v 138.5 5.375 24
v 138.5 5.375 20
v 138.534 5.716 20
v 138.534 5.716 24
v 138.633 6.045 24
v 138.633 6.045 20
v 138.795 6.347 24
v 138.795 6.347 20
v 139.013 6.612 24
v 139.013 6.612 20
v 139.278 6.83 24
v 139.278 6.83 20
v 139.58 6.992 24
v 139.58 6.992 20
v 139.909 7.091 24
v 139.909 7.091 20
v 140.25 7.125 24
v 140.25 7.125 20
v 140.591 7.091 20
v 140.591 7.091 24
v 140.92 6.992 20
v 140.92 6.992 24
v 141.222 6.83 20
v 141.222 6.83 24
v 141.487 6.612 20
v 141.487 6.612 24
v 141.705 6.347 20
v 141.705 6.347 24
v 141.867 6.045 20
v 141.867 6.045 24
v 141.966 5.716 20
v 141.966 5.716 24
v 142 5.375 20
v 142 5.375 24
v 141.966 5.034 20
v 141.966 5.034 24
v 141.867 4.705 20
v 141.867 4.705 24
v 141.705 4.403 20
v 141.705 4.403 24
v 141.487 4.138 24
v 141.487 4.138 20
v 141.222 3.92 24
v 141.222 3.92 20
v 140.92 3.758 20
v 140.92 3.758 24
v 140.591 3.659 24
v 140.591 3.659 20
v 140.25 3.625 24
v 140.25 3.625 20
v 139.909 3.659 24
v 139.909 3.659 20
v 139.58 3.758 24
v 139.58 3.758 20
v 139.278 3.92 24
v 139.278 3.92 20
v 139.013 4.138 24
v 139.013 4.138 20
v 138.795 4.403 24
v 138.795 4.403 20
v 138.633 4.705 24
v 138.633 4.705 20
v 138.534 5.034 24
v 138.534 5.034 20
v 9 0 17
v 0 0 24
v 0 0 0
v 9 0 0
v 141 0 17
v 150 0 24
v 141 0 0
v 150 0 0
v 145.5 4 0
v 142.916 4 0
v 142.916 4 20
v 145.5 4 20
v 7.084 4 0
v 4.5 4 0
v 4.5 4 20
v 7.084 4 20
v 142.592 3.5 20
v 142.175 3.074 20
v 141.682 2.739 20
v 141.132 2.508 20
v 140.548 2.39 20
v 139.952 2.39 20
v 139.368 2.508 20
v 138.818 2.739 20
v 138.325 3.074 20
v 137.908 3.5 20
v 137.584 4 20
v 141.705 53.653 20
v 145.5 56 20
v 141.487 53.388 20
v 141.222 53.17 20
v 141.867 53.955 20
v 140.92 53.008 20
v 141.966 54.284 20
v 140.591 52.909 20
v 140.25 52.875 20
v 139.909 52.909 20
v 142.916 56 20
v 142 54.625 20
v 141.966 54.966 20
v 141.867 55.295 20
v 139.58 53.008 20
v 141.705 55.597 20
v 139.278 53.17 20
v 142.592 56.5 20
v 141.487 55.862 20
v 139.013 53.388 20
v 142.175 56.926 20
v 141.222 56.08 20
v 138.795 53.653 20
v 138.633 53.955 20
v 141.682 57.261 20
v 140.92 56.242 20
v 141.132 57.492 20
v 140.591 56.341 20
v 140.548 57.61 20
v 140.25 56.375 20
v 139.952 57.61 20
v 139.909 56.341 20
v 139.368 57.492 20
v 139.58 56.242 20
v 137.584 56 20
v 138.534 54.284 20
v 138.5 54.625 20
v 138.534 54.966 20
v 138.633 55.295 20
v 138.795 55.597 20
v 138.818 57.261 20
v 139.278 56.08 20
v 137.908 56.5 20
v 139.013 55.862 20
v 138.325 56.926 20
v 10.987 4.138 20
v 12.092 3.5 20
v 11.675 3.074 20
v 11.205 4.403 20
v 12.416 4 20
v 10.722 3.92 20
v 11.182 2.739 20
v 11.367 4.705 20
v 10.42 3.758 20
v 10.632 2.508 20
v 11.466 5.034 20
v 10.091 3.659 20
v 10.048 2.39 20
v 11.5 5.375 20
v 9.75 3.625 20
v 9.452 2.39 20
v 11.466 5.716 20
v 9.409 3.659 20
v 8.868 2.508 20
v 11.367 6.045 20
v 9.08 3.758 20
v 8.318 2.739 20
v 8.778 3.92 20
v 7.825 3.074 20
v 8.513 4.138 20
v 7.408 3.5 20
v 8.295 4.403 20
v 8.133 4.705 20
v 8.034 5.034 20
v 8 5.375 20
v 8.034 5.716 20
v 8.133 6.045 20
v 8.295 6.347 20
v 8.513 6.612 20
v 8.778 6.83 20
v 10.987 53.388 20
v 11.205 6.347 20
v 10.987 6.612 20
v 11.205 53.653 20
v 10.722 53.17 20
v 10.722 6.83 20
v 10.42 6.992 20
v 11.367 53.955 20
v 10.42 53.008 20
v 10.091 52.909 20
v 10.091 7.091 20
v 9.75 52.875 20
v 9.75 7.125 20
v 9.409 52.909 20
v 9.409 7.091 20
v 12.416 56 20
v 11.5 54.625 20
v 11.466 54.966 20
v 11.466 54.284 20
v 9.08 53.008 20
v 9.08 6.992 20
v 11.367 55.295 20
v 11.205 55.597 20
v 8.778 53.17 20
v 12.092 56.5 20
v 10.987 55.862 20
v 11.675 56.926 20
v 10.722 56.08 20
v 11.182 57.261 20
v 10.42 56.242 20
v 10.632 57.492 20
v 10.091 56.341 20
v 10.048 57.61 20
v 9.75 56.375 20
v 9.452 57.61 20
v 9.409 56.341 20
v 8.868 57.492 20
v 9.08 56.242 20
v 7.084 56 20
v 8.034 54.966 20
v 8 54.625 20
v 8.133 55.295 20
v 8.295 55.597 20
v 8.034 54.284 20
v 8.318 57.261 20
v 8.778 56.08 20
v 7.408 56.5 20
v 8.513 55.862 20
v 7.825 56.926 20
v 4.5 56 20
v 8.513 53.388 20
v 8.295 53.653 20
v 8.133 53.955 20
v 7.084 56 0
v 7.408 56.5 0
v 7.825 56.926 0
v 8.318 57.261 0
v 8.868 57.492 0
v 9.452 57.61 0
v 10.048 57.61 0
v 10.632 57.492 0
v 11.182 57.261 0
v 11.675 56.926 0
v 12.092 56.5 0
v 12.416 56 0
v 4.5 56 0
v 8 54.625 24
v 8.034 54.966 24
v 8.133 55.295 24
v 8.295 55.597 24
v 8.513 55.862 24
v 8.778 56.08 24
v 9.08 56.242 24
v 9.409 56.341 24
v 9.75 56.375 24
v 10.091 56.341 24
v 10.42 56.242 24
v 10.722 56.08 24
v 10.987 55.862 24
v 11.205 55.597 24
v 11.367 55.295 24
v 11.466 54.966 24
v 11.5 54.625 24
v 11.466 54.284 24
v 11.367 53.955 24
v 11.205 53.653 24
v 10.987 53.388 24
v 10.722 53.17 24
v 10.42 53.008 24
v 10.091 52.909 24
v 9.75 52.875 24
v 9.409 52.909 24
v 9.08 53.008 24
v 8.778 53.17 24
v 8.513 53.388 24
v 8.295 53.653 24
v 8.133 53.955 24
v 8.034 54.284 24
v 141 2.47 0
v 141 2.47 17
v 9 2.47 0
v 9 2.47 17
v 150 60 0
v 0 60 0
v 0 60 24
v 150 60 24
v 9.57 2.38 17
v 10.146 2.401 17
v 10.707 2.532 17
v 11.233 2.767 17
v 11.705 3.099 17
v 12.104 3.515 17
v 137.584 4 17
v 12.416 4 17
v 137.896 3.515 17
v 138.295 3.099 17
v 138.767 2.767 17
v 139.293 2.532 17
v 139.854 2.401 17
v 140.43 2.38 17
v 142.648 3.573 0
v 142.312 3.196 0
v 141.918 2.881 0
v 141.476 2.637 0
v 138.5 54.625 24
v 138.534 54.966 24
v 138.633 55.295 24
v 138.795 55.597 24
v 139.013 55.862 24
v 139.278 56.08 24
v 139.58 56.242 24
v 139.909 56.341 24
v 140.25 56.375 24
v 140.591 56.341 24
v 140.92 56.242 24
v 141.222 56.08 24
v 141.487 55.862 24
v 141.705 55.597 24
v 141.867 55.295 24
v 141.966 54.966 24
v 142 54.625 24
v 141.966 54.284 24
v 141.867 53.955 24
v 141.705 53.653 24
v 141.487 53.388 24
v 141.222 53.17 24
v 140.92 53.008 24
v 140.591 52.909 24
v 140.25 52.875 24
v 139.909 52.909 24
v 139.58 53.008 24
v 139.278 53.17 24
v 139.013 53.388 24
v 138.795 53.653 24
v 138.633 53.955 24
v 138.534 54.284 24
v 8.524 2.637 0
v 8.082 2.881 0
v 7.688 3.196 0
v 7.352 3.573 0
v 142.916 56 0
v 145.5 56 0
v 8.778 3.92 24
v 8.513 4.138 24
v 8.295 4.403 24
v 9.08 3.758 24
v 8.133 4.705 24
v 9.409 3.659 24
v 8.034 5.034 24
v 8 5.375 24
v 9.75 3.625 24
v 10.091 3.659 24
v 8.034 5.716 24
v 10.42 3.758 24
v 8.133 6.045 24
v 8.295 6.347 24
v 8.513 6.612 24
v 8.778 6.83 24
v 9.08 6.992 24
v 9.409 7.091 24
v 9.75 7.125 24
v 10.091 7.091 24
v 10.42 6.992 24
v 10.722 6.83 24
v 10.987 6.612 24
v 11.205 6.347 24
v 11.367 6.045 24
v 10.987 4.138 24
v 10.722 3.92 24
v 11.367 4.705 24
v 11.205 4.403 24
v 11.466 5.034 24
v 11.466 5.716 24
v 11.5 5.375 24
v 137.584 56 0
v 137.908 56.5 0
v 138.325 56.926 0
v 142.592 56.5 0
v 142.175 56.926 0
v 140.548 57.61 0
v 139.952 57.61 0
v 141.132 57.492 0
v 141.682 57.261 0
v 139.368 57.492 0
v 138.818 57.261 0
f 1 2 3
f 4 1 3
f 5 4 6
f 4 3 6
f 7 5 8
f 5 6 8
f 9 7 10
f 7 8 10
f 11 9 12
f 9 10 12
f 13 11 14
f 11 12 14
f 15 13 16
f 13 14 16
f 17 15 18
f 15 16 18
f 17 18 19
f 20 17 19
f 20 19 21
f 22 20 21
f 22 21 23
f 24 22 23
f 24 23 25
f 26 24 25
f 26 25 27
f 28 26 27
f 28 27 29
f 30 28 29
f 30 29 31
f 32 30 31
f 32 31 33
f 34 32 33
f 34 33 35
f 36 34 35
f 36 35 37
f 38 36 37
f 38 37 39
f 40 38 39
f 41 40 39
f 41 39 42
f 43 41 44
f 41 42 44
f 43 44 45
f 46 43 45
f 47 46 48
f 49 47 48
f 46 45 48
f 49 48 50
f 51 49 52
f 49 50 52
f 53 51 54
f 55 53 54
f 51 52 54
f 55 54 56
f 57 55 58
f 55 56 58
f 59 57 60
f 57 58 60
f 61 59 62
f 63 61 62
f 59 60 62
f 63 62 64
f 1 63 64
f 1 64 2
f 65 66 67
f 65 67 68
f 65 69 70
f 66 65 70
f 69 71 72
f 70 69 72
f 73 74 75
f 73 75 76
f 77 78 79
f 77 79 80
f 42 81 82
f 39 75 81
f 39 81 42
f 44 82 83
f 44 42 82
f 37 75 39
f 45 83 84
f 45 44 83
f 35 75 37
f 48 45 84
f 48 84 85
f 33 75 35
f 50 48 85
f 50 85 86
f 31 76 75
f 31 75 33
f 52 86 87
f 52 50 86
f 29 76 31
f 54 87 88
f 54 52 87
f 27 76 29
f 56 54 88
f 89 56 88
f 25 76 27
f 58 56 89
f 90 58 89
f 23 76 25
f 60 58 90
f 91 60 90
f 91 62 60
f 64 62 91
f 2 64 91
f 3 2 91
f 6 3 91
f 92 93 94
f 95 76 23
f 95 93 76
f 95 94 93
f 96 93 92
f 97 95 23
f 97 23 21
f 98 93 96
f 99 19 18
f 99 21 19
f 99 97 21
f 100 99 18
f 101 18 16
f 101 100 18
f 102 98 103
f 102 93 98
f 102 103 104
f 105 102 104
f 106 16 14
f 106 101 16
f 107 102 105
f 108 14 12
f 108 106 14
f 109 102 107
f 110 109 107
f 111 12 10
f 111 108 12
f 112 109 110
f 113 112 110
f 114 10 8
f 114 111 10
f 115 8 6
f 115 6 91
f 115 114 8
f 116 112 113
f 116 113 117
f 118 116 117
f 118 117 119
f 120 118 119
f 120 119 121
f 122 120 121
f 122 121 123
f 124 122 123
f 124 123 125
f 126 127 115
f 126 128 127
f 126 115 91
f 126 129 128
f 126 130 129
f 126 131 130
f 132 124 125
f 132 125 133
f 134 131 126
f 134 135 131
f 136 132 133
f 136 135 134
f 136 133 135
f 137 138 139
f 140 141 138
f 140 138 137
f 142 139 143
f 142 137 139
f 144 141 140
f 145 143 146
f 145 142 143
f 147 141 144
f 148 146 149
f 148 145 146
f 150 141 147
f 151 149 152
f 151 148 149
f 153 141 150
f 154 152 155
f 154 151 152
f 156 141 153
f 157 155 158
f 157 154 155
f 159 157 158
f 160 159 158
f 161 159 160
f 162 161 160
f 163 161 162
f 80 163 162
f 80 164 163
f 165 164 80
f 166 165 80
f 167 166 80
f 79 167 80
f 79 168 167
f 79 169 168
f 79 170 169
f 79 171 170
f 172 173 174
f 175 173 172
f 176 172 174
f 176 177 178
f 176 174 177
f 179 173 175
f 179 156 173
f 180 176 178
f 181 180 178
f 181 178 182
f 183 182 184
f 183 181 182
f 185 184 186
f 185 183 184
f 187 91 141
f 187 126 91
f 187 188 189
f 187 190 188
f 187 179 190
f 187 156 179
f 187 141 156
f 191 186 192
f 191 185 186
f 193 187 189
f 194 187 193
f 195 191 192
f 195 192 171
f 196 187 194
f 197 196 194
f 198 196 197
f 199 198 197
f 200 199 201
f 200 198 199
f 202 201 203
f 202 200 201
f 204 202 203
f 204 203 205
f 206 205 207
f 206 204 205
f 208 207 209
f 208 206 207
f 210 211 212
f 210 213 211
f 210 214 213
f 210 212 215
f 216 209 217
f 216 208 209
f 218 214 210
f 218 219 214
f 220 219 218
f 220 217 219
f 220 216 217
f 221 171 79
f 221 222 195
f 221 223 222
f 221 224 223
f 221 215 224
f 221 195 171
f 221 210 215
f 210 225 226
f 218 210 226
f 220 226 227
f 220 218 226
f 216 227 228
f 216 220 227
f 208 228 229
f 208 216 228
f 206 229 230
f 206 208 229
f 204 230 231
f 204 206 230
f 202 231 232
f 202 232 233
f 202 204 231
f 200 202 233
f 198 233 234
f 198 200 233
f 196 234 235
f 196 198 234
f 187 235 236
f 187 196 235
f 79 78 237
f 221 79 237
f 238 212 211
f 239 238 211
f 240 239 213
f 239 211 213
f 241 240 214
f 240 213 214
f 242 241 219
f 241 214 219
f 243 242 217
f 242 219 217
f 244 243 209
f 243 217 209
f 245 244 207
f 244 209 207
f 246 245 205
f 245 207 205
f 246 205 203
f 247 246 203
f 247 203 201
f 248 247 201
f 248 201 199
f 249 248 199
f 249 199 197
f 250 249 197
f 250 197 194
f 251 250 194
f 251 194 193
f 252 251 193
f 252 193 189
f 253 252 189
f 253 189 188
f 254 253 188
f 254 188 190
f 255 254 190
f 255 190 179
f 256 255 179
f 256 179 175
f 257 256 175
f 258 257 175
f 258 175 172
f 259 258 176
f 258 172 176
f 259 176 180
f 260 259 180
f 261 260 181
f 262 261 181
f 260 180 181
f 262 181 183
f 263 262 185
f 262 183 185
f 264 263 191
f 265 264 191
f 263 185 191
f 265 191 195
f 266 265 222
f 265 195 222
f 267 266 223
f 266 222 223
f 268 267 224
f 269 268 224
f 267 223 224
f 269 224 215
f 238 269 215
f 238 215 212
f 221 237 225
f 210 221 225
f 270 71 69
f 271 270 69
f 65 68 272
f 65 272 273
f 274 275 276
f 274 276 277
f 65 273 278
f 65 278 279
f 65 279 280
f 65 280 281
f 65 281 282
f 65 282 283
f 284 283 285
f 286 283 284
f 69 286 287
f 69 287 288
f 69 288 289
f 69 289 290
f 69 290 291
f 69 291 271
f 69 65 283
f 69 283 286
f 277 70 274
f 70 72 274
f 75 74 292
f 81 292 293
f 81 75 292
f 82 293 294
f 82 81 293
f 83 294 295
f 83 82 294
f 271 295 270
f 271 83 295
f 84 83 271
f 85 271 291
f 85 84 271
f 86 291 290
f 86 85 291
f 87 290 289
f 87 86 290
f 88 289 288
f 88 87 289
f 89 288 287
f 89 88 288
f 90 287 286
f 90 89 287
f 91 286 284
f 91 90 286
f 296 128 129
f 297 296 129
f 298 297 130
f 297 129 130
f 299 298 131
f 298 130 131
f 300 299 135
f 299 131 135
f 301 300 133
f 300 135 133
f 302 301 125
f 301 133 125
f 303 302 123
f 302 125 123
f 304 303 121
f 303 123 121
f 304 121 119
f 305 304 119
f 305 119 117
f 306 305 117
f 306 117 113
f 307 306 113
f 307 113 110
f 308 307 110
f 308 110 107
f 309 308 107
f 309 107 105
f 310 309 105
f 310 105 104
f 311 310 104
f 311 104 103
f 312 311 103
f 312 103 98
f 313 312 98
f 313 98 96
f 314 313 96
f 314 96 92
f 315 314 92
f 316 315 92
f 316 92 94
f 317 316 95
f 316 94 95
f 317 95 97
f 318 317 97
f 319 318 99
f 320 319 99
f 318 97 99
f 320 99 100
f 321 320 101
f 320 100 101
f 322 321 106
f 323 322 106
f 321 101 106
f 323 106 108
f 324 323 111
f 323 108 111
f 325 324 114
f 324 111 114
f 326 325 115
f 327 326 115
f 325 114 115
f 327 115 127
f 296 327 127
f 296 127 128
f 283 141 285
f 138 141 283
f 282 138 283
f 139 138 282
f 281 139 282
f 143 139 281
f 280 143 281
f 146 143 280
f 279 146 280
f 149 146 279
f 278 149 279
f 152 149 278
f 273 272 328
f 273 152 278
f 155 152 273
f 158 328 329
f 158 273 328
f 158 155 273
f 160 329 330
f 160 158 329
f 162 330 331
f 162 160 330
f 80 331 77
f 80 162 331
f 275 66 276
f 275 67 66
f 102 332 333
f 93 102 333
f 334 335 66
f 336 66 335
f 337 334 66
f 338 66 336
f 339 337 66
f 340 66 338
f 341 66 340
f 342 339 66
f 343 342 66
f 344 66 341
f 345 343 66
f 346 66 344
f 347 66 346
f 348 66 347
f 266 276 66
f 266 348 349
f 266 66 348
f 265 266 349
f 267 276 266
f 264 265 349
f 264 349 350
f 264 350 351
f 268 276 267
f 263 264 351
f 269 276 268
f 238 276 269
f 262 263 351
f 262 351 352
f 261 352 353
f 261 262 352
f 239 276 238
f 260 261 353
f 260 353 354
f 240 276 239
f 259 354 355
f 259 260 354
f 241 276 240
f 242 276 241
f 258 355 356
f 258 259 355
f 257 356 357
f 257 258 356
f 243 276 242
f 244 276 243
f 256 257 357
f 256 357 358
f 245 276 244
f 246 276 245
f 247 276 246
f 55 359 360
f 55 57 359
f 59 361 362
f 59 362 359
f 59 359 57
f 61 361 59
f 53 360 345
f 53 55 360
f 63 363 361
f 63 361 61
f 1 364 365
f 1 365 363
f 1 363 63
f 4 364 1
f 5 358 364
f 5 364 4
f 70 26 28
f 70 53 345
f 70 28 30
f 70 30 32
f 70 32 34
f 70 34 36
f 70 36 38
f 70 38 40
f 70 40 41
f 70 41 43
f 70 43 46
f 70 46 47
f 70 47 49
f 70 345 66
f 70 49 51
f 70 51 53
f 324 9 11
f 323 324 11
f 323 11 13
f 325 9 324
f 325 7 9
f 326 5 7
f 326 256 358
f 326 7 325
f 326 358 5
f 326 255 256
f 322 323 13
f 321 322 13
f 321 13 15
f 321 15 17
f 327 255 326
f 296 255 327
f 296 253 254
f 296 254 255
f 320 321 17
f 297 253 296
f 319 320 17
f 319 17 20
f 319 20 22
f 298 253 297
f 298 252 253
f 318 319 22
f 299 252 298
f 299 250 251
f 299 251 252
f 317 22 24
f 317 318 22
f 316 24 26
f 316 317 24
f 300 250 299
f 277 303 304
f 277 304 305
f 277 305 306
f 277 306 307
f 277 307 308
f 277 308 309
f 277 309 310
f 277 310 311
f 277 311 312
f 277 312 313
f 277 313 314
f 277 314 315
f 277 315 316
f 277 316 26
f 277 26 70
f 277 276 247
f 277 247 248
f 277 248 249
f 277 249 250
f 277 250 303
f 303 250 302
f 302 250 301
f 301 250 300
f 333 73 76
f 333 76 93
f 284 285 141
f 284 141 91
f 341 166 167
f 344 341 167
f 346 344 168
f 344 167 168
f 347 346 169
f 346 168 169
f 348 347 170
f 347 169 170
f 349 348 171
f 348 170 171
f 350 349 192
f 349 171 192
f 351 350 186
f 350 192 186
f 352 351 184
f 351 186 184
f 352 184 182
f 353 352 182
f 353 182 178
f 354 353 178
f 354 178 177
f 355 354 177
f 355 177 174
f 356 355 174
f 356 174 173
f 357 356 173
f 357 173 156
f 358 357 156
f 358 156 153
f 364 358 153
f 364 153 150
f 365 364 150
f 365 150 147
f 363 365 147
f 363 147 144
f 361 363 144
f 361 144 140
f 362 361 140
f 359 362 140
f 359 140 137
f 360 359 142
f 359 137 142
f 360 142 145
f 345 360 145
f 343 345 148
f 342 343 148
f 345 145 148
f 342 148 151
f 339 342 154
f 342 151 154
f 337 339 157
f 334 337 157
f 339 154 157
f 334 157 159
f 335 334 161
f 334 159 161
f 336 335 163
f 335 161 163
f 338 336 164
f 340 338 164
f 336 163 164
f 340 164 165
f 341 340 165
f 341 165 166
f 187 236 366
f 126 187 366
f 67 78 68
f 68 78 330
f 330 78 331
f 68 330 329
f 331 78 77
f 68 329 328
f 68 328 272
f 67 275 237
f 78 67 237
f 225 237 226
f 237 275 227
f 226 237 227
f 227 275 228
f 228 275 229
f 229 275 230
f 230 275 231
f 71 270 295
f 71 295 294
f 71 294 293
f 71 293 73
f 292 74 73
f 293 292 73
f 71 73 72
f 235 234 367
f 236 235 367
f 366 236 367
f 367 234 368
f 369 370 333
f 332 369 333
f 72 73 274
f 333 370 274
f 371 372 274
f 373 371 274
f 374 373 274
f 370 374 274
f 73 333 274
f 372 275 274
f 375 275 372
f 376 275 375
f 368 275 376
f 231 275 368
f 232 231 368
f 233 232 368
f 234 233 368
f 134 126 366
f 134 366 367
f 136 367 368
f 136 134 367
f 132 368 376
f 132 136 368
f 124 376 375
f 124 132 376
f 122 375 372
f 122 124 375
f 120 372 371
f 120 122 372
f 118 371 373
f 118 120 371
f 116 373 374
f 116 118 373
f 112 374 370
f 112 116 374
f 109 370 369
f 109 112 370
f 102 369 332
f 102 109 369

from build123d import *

# Parameters (mm, degrees)
SKETCH1_W               = 150
SKETCH1_H               = 60
SKETCH1_W_2             = 141
SKETCH1_H_2             = 52
BOSS_EXTRUDE1_DEPTH     = 20
SKETCH2_W               = 150
SKETCH2_H               = 60
BOSS_EXTRUDE2_DEPTH     = 4
SKETCH3_W               = 132
SKETCH3_H               = 17
CUT_EXTRUDE1_DEPTH      = 16
SKETCH4_R               = 1.75
CUT_EXTRUDE3_DEPTH      = 21
CUT_EXTRUDE3_DEPTH_BACK = 5
CUT_EXTRUDE4_START      = -20
SKETCH5_R               = 3
CUT_EXTRUDE4_DEPTH      = 20


with BuildPart() as part:
    # Sketch1 → Boss-Extrude1 (new body)
    with BuildSketch(Plane.XY):
        with Locations((75, 30)):
            Rectangle(SKETCH1_W, SKETCH1_H)
        with Locations((75, 30)):
            Rectangle(SKETCH1_W_2, SKETCH1_H_2, mode=Mode.SUBTRACT)
    extrude(amount=BOSS_EXTRUDE1_DEPTH)

    # Sketch2 → Boss-Extrude2 (add)
    with BuildSketch(Plane.XY.offset(20)):
        with Locations((75, 30)):
            Rectangle(SKETCH2_W, SKETCH2_H)
    extrude(amount=BOSS_EXTRUDE2_DEPTH)

    # Sketch3 → Cut-Extrude1 (cut)
    with BuildSketch(Plane.XZ):
        with Locations((75, 8.5)):
            Rectangle(SKETCH3_W, SKETCH3_H)
    extrude(amount=-CUT_EXTRUDE1_DEPTH, mode=Mode.SUBTRACT)

    # Sketch4 → Cut-Extrude3 (cut, two sides)
    with BuildSketch(Plane(origin=(0, 0, 20), x_dir=(-1, 0, 0), z_dir=(0, 0, -1))) as cut_extrude3_sk:
        with Locations((-140.25, 54.625)):
            Circle(SKETCH4_R)
        with Locations((-9.75, 54.625)):
            Circle(SKETCH4_R)
        with Locations((-9.75, 5.375)):
            Circle(SKETCH4_R)
        with Locations((-140.25, 5.375)):
            Circle(SKETCH4_R)
    extrude(amount=CUT_EXTRUDE3_DEPTH, mode=Mode.SUBTRACT)
    extrude(cut_extrude3_sk.sketch, amount=-CUT_EXTRUDE3_DEPTH_BACK, mode=Mode.SUBTRACT)

    # Sketch5 → Cut-Extrude4 (cut)
    with BuildSketch(Plane(origin=(0, 0, 0), x_dir=(-1, 0, 0), z_dir=(0, 0, -1)).offset(CUT_EXTRUDE4_START)):
        with Locations((-140.25, 5.375)):
            Circle(SKETCH5_R)
        with Locations((-9.75, 5.375)):
            Circle(SKETCH5_R)
        with Locations((-140.25, 54.625)):
            Circle(SKETCH5_R)
        with Locations((-9.75, 54.625)):
            Circle(SKETCH5_R)
    extrude(amount=CUT_EXTRUDE4_DEPTH, mode=Mode.SUBTRACT)


solid = part.part
